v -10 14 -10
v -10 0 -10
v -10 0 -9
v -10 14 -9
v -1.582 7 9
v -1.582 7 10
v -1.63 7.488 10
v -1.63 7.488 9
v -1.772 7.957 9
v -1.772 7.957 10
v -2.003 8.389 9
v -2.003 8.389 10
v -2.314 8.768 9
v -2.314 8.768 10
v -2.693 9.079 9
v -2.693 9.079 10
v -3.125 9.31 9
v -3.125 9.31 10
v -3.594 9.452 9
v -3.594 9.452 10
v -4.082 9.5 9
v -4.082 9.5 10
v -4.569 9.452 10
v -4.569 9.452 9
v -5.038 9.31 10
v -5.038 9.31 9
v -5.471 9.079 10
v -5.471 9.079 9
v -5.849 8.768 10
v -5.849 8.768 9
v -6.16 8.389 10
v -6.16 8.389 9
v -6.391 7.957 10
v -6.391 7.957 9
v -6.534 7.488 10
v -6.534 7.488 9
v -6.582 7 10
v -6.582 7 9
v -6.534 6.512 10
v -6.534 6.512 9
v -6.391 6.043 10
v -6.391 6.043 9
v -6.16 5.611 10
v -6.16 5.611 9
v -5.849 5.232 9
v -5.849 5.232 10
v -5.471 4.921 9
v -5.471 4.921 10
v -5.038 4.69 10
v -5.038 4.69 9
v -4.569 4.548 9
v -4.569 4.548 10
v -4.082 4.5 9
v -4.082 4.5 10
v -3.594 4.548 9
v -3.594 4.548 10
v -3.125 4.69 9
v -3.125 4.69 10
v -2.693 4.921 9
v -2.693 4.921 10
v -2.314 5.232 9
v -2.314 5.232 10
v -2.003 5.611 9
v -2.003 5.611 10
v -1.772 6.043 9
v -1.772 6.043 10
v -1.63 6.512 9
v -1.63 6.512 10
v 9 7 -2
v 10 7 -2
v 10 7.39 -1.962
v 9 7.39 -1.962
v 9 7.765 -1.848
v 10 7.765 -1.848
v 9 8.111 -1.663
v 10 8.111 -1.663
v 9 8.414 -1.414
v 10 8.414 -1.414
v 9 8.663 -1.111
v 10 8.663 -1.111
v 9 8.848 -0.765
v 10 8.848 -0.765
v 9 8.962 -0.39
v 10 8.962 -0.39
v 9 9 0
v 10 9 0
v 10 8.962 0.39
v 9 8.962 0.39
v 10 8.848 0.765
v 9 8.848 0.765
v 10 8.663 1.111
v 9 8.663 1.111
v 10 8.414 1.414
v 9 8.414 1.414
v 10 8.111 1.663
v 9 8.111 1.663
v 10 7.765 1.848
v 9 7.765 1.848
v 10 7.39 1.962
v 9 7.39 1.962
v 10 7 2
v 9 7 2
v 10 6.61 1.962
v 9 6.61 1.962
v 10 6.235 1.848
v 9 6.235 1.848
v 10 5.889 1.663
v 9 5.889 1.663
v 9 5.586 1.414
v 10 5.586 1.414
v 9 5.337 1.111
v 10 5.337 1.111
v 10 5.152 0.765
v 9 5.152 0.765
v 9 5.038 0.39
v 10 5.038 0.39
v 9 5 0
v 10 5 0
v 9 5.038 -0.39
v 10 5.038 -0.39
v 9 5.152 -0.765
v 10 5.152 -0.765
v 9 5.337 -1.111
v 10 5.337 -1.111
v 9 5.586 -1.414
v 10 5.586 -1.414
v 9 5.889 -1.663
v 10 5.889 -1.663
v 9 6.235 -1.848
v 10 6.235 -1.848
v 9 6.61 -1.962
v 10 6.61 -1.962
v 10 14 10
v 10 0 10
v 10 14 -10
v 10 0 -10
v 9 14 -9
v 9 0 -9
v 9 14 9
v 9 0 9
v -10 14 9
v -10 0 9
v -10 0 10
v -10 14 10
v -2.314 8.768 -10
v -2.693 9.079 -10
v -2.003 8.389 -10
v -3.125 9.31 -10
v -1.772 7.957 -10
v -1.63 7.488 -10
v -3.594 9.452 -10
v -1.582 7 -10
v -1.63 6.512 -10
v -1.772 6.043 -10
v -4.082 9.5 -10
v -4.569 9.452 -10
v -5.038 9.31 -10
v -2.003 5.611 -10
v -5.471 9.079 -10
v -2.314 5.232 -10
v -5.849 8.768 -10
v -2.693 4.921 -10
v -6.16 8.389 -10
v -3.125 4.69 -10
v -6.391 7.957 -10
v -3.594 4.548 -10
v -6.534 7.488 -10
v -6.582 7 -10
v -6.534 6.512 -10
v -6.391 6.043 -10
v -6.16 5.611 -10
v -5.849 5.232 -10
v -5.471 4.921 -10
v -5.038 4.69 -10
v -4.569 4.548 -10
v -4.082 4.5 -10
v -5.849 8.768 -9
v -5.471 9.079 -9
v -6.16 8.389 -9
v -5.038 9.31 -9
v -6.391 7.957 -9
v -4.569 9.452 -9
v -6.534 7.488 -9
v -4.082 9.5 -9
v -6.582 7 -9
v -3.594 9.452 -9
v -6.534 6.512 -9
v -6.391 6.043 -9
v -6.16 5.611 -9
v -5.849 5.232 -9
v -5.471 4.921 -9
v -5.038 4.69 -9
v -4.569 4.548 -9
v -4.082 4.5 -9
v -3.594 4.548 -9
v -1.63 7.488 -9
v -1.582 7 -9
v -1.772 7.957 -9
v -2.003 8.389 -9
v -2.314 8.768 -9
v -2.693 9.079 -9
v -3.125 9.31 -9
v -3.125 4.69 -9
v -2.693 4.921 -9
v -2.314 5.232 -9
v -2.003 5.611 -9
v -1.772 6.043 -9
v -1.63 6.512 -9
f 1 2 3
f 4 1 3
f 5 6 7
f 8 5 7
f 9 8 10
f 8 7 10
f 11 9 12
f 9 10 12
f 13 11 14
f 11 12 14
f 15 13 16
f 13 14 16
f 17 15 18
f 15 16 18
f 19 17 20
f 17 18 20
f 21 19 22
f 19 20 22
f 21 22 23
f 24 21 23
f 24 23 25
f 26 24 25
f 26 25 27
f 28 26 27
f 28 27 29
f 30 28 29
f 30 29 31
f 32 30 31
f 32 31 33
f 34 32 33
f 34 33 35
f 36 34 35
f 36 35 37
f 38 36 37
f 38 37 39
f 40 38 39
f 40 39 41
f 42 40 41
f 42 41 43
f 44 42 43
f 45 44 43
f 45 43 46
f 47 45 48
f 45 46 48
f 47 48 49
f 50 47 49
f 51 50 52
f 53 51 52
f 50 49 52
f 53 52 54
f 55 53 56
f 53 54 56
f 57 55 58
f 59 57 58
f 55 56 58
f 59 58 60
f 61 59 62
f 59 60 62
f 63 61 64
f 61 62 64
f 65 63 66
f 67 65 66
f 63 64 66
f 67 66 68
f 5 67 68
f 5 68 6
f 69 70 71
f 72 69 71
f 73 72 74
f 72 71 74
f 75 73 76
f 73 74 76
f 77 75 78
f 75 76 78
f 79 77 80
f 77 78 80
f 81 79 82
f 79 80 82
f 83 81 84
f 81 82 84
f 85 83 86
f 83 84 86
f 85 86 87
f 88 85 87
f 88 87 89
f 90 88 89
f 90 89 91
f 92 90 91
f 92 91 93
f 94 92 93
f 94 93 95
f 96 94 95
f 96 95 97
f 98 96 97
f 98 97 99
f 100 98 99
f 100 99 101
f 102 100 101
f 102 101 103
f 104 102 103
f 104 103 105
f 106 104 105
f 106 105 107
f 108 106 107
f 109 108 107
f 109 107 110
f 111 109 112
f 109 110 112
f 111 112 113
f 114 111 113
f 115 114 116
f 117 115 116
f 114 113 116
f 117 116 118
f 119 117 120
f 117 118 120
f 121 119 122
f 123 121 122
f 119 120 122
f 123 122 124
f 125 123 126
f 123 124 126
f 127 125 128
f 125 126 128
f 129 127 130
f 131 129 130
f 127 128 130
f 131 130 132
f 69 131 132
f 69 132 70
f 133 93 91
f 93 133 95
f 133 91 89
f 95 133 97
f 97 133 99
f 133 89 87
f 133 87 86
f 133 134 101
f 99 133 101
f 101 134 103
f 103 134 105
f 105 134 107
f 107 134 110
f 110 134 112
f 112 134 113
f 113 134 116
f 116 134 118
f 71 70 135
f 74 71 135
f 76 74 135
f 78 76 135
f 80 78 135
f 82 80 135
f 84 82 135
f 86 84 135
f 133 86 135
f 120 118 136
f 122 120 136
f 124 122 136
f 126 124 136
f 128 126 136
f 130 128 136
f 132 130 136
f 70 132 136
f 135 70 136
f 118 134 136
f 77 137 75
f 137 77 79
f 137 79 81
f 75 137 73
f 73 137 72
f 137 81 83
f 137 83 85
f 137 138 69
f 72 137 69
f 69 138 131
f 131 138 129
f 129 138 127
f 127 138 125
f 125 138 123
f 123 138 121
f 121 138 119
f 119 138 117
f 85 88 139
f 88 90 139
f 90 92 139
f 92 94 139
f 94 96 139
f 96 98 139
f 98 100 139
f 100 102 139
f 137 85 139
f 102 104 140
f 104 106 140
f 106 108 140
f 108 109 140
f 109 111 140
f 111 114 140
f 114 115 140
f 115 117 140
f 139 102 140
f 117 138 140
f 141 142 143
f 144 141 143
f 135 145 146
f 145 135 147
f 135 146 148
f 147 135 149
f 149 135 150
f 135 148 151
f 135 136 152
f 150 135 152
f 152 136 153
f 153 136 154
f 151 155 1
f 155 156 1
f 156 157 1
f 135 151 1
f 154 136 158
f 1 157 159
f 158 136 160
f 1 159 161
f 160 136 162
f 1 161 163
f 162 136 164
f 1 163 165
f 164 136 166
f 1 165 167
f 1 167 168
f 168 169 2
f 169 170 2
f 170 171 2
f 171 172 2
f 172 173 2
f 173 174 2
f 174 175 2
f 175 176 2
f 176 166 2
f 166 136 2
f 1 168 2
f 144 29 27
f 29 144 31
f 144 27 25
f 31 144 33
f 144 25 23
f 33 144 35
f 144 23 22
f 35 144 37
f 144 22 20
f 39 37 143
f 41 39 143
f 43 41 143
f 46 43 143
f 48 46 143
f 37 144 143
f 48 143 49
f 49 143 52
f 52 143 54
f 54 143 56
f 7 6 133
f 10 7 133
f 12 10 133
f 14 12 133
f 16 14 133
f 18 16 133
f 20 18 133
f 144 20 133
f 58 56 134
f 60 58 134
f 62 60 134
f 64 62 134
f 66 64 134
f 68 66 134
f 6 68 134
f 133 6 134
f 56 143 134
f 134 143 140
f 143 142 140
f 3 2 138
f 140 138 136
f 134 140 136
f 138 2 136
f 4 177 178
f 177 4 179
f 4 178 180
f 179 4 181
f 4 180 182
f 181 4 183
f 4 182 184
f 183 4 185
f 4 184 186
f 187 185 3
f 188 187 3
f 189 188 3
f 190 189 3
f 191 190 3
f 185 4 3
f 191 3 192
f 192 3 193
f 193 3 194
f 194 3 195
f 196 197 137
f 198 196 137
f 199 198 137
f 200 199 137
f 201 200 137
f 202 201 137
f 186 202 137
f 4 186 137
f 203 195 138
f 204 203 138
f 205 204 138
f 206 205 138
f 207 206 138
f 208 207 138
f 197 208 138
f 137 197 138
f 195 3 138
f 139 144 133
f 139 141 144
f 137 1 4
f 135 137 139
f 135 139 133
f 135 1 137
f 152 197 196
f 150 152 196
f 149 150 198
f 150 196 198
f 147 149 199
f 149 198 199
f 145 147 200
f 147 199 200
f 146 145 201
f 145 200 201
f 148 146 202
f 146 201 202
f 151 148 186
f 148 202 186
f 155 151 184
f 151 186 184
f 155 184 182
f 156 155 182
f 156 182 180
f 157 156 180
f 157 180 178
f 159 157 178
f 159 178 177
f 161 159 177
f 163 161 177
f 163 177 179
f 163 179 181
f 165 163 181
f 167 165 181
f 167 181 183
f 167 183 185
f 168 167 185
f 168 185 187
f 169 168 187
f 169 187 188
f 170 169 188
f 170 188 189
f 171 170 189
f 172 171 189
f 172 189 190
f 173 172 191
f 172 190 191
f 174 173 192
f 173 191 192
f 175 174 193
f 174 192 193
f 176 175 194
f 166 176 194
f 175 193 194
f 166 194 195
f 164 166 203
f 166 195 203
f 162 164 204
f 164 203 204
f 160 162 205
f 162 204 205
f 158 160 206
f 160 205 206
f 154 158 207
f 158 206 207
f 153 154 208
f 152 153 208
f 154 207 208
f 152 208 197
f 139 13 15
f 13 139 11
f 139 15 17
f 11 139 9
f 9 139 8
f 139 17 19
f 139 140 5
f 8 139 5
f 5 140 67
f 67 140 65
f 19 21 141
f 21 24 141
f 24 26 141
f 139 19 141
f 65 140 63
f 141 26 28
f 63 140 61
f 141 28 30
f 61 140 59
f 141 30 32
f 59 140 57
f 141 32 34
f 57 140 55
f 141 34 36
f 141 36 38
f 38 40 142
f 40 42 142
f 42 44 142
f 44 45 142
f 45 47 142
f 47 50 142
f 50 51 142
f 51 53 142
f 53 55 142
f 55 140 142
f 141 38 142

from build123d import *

# Parameters (mm, degrees)
BOSS_EXTRUDE1_DEPTH = 14
SKETCH2_R           = 2.5
CUT_EXTRUDE1_DEPTH  = 20
CUT_EXTRUDE2_REACH  = 22
SKETCH3_R           = 2


with BuildPart() as part:
    # Sketch1 → Boss-Extrude1 (new body)
    with BuildSketch(Plane(origin=(0, 0, 0), x_dir=(1, 0, 0), z_dir=(0, 1, 0))):
        Polygon((-10, -10), (10, -10), (10, 10), (-10, 10), (-10, 9), (9, 9), (9, -9), (-10, -9), align=None)
    extrude(amount=BOSS_EXTRUDE1_DEPTH)

    # Sketch2 → Cut-Extrude1 (cut)
    with BuildSketch(Plane.XY.offset(10)):
        with Locations((-4.081710117, 7)):
            Circle(SKETCH2_R)
    extrude(amount=-CUT_EXTRUDE1_DEPTH, mode=Mode.SUBTRACT)

    # Sketch3 → Cut-Extrude2 (cut, up to next)
    with BuildSketch(Plane(origin=(10, 0, 0), x_dir=(0, 0, -1), z_dir=(1, 0, 0)), mode=Mode.PRIVATE) as cut_extrude2_sk1:
        with Locations((0, 7)):
            Circle(SKETCH3_R)
    cut_extrude2_tool1 = extrude(cut_extrude2_sk1.sketch, amount=-CUT_EXTRUDE2_REACH, mode=Mode.PRIVATE) & part.part
    add(cut_extrude2_tool1.solids().sort_by_distance((10, 7, 0))[0], mode=Mode.SUBTRACT)


solid = part.part
